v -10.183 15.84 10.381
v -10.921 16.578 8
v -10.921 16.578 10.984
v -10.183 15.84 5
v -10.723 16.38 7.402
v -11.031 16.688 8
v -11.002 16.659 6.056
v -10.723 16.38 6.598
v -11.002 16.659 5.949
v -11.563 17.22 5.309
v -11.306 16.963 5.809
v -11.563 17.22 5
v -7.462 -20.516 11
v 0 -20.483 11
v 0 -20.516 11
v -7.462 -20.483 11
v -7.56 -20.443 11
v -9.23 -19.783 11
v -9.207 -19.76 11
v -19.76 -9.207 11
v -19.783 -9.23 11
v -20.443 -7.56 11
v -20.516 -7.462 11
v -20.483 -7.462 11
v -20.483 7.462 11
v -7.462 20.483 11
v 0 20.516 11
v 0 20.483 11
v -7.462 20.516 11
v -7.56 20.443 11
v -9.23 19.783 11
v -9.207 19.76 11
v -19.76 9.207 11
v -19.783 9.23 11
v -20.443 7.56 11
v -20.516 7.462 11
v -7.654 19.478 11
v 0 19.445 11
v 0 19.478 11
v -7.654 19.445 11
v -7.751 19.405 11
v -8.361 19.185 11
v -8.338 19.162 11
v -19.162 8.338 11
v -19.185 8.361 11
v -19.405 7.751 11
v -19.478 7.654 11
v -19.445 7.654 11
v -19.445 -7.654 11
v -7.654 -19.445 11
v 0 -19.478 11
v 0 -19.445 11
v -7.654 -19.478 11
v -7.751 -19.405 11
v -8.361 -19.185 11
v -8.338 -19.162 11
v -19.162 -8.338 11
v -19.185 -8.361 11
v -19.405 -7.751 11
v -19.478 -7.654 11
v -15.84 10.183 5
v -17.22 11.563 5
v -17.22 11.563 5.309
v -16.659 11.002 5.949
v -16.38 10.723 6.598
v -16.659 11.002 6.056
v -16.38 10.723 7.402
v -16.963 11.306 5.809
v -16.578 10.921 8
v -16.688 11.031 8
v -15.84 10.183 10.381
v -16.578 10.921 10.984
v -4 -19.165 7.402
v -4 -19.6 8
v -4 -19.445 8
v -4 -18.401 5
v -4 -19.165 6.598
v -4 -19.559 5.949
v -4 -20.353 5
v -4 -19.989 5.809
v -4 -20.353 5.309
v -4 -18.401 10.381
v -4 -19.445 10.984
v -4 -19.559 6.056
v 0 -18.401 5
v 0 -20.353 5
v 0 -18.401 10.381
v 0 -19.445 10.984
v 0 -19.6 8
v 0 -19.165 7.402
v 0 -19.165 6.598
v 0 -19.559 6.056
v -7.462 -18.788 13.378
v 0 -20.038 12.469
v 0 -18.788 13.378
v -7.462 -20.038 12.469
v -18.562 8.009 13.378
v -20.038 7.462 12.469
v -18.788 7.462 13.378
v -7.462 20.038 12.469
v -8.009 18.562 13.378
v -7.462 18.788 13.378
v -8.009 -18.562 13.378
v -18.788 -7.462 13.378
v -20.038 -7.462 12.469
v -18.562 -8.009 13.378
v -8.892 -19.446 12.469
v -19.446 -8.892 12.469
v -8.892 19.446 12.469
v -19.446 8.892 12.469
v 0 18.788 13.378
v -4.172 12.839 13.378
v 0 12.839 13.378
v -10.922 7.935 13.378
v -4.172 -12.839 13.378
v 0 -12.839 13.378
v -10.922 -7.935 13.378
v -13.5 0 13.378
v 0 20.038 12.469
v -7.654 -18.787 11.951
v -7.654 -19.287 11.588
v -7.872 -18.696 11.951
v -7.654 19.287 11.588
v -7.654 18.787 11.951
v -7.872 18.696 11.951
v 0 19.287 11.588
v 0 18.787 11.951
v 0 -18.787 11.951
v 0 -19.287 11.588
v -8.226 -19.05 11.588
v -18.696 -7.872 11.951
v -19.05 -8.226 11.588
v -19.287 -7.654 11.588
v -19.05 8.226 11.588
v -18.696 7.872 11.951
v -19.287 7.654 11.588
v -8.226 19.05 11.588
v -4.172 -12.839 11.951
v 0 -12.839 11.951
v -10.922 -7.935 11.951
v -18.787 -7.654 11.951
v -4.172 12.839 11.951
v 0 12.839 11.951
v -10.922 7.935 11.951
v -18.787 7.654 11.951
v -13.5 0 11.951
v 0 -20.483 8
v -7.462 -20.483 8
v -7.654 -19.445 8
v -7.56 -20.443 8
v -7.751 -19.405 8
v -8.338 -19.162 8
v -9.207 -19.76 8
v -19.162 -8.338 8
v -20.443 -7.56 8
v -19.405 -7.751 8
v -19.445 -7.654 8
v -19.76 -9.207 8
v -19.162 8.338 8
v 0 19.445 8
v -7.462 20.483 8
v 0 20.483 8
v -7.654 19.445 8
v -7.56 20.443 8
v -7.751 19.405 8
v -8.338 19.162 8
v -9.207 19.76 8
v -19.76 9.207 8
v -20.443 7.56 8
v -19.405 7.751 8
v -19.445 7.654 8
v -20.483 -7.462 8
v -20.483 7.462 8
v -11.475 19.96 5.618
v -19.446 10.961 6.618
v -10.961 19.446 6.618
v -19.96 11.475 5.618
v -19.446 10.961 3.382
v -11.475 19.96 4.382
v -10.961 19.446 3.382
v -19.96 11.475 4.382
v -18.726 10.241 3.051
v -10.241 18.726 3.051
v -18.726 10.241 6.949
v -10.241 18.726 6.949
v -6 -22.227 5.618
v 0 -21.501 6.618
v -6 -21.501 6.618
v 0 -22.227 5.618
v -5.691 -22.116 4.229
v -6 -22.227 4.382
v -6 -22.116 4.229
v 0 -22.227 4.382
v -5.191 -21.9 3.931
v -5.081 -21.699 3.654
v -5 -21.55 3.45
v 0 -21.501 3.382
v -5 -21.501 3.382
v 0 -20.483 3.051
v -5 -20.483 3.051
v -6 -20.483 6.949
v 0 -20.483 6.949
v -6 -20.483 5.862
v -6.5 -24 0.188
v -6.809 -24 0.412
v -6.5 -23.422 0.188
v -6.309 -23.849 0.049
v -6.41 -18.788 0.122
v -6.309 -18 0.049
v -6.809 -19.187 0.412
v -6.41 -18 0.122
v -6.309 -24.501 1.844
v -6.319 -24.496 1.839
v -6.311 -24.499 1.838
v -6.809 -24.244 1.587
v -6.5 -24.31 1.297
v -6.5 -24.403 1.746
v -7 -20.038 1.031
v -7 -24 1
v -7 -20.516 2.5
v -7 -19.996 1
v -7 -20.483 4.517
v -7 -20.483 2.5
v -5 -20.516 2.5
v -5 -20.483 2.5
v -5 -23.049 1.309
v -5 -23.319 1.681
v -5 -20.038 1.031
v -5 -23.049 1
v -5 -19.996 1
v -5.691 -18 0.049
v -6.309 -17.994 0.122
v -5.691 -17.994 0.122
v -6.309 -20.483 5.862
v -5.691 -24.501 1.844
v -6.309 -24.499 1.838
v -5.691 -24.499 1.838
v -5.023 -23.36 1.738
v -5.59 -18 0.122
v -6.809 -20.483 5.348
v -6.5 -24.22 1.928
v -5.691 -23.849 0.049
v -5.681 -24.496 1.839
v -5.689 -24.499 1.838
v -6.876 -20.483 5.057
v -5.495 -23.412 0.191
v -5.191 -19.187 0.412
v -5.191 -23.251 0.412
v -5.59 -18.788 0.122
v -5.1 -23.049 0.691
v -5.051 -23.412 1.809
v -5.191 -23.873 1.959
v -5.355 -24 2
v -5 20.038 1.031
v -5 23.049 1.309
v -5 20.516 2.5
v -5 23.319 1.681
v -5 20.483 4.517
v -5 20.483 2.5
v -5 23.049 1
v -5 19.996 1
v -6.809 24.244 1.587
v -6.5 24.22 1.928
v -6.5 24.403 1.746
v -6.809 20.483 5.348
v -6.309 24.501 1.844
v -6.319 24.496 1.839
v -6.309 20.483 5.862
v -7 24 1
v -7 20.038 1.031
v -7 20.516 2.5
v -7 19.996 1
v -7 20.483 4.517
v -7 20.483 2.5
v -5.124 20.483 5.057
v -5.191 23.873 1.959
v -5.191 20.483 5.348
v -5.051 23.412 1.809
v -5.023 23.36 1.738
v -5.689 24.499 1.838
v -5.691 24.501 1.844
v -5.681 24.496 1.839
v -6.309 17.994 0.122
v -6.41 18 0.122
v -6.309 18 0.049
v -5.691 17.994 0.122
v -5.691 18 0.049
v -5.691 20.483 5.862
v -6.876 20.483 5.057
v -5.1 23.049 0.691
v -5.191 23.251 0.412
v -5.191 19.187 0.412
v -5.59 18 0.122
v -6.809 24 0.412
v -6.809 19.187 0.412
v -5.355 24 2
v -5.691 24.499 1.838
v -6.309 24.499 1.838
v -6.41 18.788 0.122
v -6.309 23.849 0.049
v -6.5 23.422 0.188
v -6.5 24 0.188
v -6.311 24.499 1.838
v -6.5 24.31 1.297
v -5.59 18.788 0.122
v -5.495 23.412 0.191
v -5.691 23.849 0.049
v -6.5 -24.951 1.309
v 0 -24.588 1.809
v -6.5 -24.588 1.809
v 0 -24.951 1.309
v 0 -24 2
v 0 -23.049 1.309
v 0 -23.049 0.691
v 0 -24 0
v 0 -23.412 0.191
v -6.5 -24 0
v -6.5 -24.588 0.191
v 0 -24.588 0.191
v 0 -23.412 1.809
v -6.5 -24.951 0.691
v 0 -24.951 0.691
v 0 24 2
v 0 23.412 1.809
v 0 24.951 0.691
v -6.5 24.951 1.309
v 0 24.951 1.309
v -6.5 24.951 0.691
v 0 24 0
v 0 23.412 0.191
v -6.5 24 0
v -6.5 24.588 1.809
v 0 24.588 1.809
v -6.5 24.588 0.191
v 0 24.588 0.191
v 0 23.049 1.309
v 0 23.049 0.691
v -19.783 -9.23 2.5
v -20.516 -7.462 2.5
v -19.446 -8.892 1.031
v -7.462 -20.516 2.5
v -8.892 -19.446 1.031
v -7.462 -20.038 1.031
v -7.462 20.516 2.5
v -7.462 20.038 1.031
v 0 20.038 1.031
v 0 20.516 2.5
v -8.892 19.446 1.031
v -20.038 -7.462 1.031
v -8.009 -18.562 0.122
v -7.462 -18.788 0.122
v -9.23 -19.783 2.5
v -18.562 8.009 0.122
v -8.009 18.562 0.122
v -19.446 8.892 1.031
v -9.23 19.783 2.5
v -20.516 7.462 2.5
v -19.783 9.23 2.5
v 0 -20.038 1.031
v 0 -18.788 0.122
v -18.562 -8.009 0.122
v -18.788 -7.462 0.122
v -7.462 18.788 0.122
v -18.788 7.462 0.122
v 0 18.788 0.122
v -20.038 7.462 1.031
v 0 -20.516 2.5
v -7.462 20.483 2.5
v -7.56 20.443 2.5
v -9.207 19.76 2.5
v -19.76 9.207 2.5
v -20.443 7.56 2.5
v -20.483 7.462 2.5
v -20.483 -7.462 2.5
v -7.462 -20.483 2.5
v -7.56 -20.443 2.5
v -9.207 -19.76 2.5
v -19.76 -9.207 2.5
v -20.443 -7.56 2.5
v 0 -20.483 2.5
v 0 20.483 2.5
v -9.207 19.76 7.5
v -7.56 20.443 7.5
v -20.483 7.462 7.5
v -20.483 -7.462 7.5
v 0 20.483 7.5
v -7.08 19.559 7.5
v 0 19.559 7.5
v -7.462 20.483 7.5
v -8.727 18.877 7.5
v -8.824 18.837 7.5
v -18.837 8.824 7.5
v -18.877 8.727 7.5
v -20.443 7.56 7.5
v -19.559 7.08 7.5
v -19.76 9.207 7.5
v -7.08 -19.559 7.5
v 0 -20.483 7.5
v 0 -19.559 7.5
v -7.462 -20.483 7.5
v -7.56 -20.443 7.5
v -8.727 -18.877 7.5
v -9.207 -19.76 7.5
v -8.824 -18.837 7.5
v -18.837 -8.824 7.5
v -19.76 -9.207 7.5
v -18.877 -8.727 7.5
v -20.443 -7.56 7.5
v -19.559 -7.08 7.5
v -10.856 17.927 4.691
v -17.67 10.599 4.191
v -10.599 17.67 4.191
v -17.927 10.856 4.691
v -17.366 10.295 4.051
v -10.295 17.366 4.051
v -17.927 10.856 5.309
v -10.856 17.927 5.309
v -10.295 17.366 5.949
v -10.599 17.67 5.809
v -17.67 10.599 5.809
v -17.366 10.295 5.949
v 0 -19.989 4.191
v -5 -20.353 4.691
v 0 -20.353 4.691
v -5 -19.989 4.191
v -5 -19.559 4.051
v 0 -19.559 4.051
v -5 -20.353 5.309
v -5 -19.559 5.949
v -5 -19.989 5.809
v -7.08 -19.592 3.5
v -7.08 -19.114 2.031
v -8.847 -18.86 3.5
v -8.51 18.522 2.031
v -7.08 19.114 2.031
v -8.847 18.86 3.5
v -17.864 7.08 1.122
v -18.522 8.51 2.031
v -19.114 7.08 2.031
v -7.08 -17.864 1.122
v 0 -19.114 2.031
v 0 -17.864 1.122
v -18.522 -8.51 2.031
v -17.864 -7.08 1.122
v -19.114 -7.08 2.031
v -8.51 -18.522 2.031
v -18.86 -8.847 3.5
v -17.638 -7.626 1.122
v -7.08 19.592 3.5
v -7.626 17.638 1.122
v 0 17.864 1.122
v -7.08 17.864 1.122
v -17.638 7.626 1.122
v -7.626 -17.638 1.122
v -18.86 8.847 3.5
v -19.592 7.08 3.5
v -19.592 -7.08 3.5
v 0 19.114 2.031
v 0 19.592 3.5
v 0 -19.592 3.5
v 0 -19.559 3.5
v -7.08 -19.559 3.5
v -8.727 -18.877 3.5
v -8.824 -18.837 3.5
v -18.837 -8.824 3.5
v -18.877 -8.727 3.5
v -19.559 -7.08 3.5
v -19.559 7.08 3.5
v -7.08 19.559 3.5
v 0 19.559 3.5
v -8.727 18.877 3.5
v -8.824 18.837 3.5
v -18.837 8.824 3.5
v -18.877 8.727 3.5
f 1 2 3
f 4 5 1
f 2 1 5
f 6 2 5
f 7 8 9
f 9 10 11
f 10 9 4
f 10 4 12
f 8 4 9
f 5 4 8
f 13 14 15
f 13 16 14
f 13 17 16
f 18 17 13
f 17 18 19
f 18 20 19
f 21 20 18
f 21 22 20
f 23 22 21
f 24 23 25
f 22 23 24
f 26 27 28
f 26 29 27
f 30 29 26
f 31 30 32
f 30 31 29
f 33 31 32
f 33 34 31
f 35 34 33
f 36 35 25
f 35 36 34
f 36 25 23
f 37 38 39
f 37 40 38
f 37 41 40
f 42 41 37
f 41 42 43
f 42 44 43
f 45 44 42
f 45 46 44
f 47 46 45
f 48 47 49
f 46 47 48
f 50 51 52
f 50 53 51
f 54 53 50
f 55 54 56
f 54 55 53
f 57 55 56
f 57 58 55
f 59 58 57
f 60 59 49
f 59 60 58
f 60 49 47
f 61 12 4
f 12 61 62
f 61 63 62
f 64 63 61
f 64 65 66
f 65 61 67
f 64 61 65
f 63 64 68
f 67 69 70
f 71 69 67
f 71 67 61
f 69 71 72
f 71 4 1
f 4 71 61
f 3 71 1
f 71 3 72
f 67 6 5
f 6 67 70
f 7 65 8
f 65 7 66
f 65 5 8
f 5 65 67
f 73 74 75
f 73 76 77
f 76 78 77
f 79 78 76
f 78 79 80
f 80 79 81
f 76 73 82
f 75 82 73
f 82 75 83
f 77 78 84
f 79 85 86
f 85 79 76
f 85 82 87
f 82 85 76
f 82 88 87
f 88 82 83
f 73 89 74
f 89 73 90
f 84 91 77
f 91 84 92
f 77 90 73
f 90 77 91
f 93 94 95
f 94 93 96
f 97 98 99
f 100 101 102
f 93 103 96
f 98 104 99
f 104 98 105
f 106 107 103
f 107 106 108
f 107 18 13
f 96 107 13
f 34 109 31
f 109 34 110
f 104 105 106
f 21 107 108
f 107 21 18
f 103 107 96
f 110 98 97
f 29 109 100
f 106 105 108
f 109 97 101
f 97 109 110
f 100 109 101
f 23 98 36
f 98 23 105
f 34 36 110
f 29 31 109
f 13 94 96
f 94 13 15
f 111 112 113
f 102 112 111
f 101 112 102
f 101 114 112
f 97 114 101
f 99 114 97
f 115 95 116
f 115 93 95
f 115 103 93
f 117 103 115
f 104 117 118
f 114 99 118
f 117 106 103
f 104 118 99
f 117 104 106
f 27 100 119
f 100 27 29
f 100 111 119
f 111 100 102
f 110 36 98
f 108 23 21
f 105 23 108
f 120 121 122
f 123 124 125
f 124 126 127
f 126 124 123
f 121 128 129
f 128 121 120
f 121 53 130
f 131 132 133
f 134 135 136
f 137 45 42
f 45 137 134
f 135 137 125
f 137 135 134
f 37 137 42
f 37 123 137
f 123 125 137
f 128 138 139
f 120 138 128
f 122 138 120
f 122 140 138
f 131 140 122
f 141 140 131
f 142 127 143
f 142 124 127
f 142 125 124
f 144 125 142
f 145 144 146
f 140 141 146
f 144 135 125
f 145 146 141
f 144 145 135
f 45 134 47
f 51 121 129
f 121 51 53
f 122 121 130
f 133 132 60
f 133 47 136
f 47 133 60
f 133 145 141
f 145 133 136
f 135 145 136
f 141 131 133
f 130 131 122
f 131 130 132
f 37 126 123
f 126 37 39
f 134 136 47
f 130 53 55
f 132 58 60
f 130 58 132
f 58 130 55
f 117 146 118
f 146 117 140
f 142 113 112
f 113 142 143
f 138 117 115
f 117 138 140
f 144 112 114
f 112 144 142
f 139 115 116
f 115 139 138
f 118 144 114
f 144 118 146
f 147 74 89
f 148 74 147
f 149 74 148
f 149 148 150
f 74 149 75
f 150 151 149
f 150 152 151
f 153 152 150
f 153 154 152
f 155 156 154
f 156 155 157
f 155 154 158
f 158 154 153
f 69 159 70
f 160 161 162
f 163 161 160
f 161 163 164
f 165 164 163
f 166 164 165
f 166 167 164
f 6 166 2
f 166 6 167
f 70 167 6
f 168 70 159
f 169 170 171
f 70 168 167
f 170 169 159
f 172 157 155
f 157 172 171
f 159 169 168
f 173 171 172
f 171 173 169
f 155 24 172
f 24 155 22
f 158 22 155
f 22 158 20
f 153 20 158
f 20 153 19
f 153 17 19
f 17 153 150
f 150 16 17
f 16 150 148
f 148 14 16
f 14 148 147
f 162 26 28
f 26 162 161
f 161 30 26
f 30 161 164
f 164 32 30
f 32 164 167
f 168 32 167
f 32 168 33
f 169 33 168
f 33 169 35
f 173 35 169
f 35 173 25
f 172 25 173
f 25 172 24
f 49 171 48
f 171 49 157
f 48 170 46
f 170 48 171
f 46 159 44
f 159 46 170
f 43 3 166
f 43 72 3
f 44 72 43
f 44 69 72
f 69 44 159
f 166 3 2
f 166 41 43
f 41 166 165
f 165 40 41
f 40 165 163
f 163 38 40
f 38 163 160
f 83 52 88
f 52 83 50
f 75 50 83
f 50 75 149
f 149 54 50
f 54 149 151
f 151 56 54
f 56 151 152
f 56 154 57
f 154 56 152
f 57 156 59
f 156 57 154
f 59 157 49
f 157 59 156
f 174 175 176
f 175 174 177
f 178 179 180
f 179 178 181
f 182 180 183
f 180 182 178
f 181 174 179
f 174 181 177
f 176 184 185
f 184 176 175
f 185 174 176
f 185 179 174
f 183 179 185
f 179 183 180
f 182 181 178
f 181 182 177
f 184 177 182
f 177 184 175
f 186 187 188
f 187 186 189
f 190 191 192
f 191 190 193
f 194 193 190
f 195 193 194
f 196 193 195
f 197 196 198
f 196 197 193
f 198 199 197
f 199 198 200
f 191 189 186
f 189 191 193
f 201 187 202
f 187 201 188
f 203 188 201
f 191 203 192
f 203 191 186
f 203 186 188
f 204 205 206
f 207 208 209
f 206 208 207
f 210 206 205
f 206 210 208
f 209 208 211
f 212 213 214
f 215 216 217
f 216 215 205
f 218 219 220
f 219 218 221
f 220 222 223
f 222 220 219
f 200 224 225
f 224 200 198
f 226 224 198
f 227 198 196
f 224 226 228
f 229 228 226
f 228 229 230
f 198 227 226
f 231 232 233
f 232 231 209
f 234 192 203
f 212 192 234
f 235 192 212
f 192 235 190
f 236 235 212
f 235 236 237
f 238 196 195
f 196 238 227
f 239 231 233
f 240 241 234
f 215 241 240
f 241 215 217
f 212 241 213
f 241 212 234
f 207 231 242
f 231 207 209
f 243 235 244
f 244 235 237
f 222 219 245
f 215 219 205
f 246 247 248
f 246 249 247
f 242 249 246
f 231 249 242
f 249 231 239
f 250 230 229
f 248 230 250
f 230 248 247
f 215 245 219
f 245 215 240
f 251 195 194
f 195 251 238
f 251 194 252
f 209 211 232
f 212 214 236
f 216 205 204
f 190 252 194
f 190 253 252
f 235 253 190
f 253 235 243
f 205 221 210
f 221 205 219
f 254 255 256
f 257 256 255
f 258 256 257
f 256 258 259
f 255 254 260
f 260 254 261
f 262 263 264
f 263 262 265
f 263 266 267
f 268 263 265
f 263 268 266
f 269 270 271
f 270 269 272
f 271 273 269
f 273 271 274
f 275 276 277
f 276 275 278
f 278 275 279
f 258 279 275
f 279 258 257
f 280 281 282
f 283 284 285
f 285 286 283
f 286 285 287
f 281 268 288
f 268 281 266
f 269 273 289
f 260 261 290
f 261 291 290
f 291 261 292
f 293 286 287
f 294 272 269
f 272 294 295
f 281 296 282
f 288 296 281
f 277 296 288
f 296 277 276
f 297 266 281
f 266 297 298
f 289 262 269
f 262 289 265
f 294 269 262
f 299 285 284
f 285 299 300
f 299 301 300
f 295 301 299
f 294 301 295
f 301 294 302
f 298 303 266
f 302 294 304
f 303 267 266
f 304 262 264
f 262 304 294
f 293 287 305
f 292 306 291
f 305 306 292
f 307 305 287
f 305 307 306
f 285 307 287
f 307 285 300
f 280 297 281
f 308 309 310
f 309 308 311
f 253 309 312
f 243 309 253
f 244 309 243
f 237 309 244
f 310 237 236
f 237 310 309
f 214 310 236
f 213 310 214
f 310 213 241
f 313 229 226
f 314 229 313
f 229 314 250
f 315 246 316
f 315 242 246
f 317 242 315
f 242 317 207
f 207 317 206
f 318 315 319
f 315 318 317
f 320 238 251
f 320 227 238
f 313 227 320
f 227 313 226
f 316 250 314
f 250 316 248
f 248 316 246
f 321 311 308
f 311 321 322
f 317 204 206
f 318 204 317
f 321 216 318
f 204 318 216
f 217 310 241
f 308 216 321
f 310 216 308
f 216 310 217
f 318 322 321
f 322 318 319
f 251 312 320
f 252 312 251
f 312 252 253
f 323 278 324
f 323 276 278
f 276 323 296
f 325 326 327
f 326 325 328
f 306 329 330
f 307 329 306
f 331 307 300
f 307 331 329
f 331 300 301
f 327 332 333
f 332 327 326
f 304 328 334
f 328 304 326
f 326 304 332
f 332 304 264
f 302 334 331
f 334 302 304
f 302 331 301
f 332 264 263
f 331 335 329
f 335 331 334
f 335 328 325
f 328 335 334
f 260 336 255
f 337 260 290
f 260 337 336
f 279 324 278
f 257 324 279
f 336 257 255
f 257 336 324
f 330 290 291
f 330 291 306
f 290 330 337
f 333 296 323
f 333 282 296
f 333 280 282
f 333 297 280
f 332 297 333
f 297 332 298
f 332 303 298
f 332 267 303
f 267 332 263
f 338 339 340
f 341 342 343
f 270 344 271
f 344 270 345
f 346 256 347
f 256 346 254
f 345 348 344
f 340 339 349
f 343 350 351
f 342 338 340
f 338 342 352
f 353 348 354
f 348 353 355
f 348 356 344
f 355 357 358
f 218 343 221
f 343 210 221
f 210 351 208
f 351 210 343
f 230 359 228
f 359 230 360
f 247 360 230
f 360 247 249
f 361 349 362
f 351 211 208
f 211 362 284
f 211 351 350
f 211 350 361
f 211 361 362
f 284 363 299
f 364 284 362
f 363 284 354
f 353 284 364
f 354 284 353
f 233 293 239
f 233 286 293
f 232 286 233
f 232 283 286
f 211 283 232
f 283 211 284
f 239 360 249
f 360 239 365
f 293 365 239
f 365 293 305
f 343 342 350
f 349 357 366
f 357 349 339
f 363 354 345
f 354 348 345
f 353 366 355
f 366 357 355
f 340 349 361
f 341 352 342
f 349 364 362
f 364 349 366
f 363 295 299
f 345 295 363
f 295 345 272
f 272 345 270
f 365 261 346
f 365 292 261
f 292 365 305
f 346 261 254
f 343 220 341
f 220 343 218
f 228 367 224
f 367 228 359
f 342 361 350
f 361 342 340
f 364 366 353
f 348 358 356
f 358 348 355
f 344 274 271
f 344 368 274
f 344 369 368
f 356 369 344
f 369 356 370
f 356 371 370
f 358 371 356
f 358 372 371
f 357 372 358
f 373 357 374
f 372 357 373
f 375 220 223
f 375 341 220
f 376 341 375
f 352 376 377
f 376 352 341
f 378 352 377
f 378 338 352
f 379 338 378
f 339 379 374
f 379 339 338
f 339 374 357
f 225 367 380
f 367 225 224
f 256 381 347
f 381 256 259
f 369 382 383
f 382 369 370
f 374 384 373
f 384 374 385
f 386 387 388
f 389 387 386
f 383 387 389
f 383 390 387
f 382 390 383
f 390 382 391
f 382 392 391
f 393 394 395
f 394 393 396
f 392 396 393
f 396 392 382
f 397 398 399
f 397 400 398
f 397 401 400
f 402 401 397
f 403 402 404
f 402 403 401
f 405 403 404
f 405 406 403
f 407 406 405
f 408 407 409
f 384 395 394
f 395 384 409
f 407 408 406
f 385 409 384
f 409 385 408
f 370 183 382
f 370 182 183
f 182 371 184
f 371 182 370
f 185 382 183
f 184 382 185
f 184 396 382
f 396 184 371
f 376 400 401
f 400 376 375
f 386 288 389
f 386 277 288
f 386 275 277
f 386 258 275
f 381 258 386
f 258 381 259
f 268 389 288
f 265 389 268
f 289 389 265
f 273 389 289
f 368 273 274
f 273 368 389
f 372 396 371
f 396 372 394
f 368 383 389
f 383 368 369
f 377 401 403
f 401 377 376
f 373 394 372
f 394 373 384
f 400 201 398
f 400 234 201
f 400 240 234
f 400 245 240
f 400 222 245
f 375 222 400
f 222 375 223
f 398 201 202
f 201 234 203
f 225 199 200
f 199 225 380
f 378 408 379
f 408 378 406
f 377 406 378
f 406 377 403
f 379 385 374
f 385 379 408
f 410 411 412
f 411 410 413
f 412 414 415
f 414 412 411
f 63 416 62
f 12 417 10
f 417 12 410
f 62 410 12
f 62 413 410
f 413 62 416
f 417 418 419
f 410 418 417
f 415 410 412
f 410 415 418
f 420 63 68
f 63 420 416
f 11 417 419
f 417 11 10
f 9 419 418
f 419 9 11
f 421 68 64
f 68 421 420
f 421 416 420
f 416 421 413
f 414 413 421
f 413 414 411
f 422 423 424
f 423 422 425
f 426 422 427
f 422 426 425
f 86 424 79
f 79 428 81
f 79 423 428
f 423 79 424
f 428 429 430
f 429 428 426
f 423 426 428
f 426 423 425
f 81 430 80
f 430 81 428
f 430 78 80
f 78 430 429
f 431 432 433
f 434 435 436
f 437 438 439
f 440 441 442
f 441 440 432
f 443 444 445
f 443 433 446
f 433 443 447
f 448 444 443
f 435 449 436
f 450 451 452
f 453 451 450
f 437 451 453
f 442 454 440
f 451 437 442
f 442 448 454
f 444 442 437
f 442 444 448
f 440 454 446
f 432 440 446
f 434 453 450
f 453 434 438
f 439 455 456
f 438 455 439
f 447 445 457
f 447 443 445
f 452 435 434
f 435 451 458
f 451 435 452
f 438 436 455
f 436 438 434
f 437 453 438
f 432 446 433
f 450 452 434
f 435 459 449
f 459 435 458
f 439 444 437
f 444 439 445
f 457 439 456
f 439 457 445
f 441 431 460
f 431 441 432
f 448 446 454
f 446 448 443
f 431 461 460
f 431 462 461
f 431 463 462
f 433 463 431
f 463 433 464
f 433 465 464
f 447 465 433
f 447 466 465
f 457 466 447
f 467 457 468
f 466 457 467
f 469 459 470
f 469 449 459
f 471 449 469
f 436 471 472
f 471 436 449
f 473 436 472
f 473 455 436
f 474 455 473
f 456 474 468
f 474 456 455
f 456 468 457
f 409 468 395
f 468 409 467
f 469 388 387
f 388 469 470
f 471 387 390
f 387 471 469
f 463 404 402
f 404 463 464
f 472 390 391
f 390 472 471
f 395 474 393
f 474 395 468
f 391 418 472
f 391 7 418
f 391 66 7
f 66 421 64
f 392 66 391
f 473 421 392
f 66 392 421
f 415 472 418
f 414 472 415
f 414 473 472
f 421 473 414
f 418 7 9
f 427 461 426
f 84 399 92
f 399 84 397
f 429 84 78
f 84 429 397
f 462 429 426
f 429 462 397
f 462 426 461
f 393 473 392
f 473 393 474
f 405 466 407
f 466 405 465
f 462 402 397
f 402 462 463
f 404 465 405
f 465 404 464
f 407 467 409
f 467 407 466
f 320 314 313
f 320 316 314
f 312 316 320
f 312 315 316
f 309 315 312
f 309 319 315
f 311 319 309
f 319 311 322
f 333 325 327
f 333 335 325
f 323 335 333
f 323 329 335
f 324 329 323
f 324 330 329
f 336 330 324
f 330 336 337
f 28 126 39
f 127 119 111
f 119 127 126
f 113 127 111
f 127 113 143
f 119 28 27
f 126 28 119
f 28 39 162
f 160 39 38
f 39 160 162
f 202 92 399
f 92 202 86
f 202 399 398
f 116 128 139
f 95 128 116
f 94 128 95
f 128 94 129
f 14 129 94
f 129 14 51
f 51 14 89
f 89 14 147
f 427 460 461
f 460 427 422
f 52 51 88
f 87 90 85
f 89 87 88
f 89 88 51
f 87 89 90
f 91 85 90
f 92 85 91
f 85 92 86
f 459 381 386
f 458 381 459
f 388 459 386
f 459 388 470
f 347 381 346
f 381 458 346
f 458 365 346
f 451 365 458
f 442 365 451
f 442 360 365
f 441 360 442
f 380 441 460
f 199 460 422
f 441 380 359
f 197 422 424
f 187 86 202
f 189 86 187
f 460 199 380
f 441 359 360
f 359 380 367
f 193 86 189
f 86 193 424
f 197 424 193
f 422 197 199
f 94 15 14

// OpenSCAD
// file: components.scad
module pcb() {
    difference() {
        rounded_hex(17, 2);
        translate([2, -19, 0]) cube([10, 4, 10], center=true);
    }
}

module battery() {
    color([1, 0, 1, 1])
    cylinder(h=3.4, r=15, center=true);
}


module display() {
    color([1, 0, 0, 1])
    translate([-16.5, 16, 0])
    import("display.stl");
}
// file: util.scad
module rounded_hex(r, h) {
    rotate([0, 0, 22.5])
    hull(){
        for (i=[0:8]) {
            rotate([0, 0, i*45])
            translate([r, 0, 0])
                cylinder(h=h, r=3, center=true);
        }
    }
}

// radius, height, corner-radius
module rounded_octagon(r, h, cr) {
    rotate([0, 0, 22.5])
    hull(){
        for (i=[0:7]) {
            rotate([0, 0, i*45])
            translate([(r - cr), 0, 0])
                cylinder(h=h, r=cr, center=true);
        }
    }
}

// radius, height
module rounded_octagon_2(r, h) {
    hull() {
        for (i=[0:7]) {
            rotate([0, 0, i*45])
                translate([cos(22.5) * (r-h/2), 0, 0])
                rotate([90, 0, 0])
                cylinder(h = 2 * (r - h/2) * cos(67.5),
                        r = h / 2,
                        center = true);
        }
    }
}

module rounded_box(dim, r) {
    minkowski() {
        cube(dim, center=true);
        sphere(r=r);
    }
}

module hollowed_octagon(r, h, wt=1) {
    difference() {
        translate([]) rounded_octagon_2(r, 5);
        rounded_octagon_2(r-wt, 2);
    }
}

module capped_cylinder(r, h) {
    cylinder(r=r, h=(h-2*r), center=true);
    translate([0, 0, -(h-2*r)/2])
        sphere(r=r);
    translate([0, 0, (h-2*r)/2])
        sphere(r=r);
}
// main file
use <util.scad>
use <components.scad>

$fn = 10;

/* Module Definitions */

module bottom_frame(r, h, wt=1) {
    translate([0, 0, h/2])
    union() {
        linear_extrude(height=h) {
            projection(cut=true) {
                translate([0, 0, 0.1])
                    rounded_octagon_2(r, h);
            }
        }

        difference() {
            rounded_octagon_2(r, h);
            translate([-r, -r, 0]) cube([r*2, r*2, h*5]);
        }   
    }
}

module bottom_frame_cutout(r, h, wt=1) {
    translate([0, 0, h/2])
    union() {
        linear_extrude(height=h) {
            projection(cut=true) {
                translate([0, 0, 0.1])
                    rounded_octagon_2(r-wt, h);
            }
        }

        difference() {
            rounded_octagon_2(r-wt, h);
            translate([-r, -r, 0]) cube([r*2, r*2, h*5]);
        }   
    }
}

module bottom_clips(r, length, dist) {
    for(i = [45, -45, 180]) {
        rotate([0, 0, i])
            translate([0, dist, 0])
            rotate([0, 90, 0])
            difference() {
                //capped_cylinder(r=r, h=length);
                cylinder(r=r, h=length, center=true);
                translate([0, -length, 0])
                    cube([length*2, length*2, length*2], center=true); 
            }
    }
}

module bottom_harness() {
    for(i = [-1, 1]) {
        for(j = [-1, 1]) {
            hull() {
                translate([j*6, i*21, 4])
                    rotate([i*45, 0, 0])
                    cylinder(r=1, h=8, center=true);

                translate([j*6, i*21, 1])
                    rotate([90, 0, 0])
                    cylinder(r=1, h=6, center=true);
            }
        }

        translate([0, i*24, 1])   
            rotate([0, 90, 0])
            cylinder(r=1, h=13, center=true);
    }

}

// Radius, height, wallthickness
module bottom(r, h, wt=1) {
        
    difference() {
        union() {
            translate([0, 0, 5])
                bottom_clips(2, 12, cos(22.5) * (r));

            bottom_harness();
            bottom_frame(r, h, wt);
        }

        translate([0, 0, 5])
           bottom_clips(1, 10, cos(22.5) * (r-1));

        translate([0, 0, 1]) bottom_frame_cutout(r, h, wt);
    }
}

module top_clips(r, length, dist) {
    for(i = [45, -45, 180]) {
        rotate([0, 0, i])
        translate([0, dist, 0])
            difference() {
                translate([0, 0, 1])
                cube([8, 2, 6], center = true);

                translate([0, -3, 8])
                    rotate([30, 0, 0])
                    cube([10, 10, 10], center=true);

                translate([0, 1, 0])
                    rotate([0, 90, 0])  
                    cylinder(r = 1.3, h = 10, center=true);
            }
    }
}


// Radius height wallthickness
module top(r, h, wt=1) {
    union() {
        translate([0, 0, -4])
            top_clips(2, 12, cos(22.5) * 21);

        translate([0, 0, -h])
            linear_extrude(height=h) {
                projection(cut=true) {
                    translate([0, 0, 0.1])
                        hollowed_octagon(r, h, wt);
                }
        }

        difference() {
            hollowed_octagon(r, h, wt);
            translate([0, 0, -(h*5)/2])
                cube([r*2, r*2, h*5], center=true);
            cylinder(r=27/2, h=10);
        }   
    }
}

module half_cut() {
    difference() {
        union() {
            translate([0, 0, 11]) top(22, 3);
            translate([0, 0, 0])bottom(22, 5);
        }

        translate([0, -25, 0]) cube([50, 50, 50]);
    }
}

module side_by_side() {
    union() {
        bottom(22, 5);
        translate([0, 50, 2.5]) rotate([0, 180, 0]) top(22, 3);
    }
}


/* Global Variables */

radius = 20;
bottom_height = 6;
thickness = 1;


/* Main Objects */

//translate([0, 0, 5]) battery();
//translate([0, 0, 10]) pcb();
translate([0, 0, 0]) display();
translate([0, 0, 15]) top(22, 3);
translate([0, 0, -15])bottom(22, 5);

!half_cut();
